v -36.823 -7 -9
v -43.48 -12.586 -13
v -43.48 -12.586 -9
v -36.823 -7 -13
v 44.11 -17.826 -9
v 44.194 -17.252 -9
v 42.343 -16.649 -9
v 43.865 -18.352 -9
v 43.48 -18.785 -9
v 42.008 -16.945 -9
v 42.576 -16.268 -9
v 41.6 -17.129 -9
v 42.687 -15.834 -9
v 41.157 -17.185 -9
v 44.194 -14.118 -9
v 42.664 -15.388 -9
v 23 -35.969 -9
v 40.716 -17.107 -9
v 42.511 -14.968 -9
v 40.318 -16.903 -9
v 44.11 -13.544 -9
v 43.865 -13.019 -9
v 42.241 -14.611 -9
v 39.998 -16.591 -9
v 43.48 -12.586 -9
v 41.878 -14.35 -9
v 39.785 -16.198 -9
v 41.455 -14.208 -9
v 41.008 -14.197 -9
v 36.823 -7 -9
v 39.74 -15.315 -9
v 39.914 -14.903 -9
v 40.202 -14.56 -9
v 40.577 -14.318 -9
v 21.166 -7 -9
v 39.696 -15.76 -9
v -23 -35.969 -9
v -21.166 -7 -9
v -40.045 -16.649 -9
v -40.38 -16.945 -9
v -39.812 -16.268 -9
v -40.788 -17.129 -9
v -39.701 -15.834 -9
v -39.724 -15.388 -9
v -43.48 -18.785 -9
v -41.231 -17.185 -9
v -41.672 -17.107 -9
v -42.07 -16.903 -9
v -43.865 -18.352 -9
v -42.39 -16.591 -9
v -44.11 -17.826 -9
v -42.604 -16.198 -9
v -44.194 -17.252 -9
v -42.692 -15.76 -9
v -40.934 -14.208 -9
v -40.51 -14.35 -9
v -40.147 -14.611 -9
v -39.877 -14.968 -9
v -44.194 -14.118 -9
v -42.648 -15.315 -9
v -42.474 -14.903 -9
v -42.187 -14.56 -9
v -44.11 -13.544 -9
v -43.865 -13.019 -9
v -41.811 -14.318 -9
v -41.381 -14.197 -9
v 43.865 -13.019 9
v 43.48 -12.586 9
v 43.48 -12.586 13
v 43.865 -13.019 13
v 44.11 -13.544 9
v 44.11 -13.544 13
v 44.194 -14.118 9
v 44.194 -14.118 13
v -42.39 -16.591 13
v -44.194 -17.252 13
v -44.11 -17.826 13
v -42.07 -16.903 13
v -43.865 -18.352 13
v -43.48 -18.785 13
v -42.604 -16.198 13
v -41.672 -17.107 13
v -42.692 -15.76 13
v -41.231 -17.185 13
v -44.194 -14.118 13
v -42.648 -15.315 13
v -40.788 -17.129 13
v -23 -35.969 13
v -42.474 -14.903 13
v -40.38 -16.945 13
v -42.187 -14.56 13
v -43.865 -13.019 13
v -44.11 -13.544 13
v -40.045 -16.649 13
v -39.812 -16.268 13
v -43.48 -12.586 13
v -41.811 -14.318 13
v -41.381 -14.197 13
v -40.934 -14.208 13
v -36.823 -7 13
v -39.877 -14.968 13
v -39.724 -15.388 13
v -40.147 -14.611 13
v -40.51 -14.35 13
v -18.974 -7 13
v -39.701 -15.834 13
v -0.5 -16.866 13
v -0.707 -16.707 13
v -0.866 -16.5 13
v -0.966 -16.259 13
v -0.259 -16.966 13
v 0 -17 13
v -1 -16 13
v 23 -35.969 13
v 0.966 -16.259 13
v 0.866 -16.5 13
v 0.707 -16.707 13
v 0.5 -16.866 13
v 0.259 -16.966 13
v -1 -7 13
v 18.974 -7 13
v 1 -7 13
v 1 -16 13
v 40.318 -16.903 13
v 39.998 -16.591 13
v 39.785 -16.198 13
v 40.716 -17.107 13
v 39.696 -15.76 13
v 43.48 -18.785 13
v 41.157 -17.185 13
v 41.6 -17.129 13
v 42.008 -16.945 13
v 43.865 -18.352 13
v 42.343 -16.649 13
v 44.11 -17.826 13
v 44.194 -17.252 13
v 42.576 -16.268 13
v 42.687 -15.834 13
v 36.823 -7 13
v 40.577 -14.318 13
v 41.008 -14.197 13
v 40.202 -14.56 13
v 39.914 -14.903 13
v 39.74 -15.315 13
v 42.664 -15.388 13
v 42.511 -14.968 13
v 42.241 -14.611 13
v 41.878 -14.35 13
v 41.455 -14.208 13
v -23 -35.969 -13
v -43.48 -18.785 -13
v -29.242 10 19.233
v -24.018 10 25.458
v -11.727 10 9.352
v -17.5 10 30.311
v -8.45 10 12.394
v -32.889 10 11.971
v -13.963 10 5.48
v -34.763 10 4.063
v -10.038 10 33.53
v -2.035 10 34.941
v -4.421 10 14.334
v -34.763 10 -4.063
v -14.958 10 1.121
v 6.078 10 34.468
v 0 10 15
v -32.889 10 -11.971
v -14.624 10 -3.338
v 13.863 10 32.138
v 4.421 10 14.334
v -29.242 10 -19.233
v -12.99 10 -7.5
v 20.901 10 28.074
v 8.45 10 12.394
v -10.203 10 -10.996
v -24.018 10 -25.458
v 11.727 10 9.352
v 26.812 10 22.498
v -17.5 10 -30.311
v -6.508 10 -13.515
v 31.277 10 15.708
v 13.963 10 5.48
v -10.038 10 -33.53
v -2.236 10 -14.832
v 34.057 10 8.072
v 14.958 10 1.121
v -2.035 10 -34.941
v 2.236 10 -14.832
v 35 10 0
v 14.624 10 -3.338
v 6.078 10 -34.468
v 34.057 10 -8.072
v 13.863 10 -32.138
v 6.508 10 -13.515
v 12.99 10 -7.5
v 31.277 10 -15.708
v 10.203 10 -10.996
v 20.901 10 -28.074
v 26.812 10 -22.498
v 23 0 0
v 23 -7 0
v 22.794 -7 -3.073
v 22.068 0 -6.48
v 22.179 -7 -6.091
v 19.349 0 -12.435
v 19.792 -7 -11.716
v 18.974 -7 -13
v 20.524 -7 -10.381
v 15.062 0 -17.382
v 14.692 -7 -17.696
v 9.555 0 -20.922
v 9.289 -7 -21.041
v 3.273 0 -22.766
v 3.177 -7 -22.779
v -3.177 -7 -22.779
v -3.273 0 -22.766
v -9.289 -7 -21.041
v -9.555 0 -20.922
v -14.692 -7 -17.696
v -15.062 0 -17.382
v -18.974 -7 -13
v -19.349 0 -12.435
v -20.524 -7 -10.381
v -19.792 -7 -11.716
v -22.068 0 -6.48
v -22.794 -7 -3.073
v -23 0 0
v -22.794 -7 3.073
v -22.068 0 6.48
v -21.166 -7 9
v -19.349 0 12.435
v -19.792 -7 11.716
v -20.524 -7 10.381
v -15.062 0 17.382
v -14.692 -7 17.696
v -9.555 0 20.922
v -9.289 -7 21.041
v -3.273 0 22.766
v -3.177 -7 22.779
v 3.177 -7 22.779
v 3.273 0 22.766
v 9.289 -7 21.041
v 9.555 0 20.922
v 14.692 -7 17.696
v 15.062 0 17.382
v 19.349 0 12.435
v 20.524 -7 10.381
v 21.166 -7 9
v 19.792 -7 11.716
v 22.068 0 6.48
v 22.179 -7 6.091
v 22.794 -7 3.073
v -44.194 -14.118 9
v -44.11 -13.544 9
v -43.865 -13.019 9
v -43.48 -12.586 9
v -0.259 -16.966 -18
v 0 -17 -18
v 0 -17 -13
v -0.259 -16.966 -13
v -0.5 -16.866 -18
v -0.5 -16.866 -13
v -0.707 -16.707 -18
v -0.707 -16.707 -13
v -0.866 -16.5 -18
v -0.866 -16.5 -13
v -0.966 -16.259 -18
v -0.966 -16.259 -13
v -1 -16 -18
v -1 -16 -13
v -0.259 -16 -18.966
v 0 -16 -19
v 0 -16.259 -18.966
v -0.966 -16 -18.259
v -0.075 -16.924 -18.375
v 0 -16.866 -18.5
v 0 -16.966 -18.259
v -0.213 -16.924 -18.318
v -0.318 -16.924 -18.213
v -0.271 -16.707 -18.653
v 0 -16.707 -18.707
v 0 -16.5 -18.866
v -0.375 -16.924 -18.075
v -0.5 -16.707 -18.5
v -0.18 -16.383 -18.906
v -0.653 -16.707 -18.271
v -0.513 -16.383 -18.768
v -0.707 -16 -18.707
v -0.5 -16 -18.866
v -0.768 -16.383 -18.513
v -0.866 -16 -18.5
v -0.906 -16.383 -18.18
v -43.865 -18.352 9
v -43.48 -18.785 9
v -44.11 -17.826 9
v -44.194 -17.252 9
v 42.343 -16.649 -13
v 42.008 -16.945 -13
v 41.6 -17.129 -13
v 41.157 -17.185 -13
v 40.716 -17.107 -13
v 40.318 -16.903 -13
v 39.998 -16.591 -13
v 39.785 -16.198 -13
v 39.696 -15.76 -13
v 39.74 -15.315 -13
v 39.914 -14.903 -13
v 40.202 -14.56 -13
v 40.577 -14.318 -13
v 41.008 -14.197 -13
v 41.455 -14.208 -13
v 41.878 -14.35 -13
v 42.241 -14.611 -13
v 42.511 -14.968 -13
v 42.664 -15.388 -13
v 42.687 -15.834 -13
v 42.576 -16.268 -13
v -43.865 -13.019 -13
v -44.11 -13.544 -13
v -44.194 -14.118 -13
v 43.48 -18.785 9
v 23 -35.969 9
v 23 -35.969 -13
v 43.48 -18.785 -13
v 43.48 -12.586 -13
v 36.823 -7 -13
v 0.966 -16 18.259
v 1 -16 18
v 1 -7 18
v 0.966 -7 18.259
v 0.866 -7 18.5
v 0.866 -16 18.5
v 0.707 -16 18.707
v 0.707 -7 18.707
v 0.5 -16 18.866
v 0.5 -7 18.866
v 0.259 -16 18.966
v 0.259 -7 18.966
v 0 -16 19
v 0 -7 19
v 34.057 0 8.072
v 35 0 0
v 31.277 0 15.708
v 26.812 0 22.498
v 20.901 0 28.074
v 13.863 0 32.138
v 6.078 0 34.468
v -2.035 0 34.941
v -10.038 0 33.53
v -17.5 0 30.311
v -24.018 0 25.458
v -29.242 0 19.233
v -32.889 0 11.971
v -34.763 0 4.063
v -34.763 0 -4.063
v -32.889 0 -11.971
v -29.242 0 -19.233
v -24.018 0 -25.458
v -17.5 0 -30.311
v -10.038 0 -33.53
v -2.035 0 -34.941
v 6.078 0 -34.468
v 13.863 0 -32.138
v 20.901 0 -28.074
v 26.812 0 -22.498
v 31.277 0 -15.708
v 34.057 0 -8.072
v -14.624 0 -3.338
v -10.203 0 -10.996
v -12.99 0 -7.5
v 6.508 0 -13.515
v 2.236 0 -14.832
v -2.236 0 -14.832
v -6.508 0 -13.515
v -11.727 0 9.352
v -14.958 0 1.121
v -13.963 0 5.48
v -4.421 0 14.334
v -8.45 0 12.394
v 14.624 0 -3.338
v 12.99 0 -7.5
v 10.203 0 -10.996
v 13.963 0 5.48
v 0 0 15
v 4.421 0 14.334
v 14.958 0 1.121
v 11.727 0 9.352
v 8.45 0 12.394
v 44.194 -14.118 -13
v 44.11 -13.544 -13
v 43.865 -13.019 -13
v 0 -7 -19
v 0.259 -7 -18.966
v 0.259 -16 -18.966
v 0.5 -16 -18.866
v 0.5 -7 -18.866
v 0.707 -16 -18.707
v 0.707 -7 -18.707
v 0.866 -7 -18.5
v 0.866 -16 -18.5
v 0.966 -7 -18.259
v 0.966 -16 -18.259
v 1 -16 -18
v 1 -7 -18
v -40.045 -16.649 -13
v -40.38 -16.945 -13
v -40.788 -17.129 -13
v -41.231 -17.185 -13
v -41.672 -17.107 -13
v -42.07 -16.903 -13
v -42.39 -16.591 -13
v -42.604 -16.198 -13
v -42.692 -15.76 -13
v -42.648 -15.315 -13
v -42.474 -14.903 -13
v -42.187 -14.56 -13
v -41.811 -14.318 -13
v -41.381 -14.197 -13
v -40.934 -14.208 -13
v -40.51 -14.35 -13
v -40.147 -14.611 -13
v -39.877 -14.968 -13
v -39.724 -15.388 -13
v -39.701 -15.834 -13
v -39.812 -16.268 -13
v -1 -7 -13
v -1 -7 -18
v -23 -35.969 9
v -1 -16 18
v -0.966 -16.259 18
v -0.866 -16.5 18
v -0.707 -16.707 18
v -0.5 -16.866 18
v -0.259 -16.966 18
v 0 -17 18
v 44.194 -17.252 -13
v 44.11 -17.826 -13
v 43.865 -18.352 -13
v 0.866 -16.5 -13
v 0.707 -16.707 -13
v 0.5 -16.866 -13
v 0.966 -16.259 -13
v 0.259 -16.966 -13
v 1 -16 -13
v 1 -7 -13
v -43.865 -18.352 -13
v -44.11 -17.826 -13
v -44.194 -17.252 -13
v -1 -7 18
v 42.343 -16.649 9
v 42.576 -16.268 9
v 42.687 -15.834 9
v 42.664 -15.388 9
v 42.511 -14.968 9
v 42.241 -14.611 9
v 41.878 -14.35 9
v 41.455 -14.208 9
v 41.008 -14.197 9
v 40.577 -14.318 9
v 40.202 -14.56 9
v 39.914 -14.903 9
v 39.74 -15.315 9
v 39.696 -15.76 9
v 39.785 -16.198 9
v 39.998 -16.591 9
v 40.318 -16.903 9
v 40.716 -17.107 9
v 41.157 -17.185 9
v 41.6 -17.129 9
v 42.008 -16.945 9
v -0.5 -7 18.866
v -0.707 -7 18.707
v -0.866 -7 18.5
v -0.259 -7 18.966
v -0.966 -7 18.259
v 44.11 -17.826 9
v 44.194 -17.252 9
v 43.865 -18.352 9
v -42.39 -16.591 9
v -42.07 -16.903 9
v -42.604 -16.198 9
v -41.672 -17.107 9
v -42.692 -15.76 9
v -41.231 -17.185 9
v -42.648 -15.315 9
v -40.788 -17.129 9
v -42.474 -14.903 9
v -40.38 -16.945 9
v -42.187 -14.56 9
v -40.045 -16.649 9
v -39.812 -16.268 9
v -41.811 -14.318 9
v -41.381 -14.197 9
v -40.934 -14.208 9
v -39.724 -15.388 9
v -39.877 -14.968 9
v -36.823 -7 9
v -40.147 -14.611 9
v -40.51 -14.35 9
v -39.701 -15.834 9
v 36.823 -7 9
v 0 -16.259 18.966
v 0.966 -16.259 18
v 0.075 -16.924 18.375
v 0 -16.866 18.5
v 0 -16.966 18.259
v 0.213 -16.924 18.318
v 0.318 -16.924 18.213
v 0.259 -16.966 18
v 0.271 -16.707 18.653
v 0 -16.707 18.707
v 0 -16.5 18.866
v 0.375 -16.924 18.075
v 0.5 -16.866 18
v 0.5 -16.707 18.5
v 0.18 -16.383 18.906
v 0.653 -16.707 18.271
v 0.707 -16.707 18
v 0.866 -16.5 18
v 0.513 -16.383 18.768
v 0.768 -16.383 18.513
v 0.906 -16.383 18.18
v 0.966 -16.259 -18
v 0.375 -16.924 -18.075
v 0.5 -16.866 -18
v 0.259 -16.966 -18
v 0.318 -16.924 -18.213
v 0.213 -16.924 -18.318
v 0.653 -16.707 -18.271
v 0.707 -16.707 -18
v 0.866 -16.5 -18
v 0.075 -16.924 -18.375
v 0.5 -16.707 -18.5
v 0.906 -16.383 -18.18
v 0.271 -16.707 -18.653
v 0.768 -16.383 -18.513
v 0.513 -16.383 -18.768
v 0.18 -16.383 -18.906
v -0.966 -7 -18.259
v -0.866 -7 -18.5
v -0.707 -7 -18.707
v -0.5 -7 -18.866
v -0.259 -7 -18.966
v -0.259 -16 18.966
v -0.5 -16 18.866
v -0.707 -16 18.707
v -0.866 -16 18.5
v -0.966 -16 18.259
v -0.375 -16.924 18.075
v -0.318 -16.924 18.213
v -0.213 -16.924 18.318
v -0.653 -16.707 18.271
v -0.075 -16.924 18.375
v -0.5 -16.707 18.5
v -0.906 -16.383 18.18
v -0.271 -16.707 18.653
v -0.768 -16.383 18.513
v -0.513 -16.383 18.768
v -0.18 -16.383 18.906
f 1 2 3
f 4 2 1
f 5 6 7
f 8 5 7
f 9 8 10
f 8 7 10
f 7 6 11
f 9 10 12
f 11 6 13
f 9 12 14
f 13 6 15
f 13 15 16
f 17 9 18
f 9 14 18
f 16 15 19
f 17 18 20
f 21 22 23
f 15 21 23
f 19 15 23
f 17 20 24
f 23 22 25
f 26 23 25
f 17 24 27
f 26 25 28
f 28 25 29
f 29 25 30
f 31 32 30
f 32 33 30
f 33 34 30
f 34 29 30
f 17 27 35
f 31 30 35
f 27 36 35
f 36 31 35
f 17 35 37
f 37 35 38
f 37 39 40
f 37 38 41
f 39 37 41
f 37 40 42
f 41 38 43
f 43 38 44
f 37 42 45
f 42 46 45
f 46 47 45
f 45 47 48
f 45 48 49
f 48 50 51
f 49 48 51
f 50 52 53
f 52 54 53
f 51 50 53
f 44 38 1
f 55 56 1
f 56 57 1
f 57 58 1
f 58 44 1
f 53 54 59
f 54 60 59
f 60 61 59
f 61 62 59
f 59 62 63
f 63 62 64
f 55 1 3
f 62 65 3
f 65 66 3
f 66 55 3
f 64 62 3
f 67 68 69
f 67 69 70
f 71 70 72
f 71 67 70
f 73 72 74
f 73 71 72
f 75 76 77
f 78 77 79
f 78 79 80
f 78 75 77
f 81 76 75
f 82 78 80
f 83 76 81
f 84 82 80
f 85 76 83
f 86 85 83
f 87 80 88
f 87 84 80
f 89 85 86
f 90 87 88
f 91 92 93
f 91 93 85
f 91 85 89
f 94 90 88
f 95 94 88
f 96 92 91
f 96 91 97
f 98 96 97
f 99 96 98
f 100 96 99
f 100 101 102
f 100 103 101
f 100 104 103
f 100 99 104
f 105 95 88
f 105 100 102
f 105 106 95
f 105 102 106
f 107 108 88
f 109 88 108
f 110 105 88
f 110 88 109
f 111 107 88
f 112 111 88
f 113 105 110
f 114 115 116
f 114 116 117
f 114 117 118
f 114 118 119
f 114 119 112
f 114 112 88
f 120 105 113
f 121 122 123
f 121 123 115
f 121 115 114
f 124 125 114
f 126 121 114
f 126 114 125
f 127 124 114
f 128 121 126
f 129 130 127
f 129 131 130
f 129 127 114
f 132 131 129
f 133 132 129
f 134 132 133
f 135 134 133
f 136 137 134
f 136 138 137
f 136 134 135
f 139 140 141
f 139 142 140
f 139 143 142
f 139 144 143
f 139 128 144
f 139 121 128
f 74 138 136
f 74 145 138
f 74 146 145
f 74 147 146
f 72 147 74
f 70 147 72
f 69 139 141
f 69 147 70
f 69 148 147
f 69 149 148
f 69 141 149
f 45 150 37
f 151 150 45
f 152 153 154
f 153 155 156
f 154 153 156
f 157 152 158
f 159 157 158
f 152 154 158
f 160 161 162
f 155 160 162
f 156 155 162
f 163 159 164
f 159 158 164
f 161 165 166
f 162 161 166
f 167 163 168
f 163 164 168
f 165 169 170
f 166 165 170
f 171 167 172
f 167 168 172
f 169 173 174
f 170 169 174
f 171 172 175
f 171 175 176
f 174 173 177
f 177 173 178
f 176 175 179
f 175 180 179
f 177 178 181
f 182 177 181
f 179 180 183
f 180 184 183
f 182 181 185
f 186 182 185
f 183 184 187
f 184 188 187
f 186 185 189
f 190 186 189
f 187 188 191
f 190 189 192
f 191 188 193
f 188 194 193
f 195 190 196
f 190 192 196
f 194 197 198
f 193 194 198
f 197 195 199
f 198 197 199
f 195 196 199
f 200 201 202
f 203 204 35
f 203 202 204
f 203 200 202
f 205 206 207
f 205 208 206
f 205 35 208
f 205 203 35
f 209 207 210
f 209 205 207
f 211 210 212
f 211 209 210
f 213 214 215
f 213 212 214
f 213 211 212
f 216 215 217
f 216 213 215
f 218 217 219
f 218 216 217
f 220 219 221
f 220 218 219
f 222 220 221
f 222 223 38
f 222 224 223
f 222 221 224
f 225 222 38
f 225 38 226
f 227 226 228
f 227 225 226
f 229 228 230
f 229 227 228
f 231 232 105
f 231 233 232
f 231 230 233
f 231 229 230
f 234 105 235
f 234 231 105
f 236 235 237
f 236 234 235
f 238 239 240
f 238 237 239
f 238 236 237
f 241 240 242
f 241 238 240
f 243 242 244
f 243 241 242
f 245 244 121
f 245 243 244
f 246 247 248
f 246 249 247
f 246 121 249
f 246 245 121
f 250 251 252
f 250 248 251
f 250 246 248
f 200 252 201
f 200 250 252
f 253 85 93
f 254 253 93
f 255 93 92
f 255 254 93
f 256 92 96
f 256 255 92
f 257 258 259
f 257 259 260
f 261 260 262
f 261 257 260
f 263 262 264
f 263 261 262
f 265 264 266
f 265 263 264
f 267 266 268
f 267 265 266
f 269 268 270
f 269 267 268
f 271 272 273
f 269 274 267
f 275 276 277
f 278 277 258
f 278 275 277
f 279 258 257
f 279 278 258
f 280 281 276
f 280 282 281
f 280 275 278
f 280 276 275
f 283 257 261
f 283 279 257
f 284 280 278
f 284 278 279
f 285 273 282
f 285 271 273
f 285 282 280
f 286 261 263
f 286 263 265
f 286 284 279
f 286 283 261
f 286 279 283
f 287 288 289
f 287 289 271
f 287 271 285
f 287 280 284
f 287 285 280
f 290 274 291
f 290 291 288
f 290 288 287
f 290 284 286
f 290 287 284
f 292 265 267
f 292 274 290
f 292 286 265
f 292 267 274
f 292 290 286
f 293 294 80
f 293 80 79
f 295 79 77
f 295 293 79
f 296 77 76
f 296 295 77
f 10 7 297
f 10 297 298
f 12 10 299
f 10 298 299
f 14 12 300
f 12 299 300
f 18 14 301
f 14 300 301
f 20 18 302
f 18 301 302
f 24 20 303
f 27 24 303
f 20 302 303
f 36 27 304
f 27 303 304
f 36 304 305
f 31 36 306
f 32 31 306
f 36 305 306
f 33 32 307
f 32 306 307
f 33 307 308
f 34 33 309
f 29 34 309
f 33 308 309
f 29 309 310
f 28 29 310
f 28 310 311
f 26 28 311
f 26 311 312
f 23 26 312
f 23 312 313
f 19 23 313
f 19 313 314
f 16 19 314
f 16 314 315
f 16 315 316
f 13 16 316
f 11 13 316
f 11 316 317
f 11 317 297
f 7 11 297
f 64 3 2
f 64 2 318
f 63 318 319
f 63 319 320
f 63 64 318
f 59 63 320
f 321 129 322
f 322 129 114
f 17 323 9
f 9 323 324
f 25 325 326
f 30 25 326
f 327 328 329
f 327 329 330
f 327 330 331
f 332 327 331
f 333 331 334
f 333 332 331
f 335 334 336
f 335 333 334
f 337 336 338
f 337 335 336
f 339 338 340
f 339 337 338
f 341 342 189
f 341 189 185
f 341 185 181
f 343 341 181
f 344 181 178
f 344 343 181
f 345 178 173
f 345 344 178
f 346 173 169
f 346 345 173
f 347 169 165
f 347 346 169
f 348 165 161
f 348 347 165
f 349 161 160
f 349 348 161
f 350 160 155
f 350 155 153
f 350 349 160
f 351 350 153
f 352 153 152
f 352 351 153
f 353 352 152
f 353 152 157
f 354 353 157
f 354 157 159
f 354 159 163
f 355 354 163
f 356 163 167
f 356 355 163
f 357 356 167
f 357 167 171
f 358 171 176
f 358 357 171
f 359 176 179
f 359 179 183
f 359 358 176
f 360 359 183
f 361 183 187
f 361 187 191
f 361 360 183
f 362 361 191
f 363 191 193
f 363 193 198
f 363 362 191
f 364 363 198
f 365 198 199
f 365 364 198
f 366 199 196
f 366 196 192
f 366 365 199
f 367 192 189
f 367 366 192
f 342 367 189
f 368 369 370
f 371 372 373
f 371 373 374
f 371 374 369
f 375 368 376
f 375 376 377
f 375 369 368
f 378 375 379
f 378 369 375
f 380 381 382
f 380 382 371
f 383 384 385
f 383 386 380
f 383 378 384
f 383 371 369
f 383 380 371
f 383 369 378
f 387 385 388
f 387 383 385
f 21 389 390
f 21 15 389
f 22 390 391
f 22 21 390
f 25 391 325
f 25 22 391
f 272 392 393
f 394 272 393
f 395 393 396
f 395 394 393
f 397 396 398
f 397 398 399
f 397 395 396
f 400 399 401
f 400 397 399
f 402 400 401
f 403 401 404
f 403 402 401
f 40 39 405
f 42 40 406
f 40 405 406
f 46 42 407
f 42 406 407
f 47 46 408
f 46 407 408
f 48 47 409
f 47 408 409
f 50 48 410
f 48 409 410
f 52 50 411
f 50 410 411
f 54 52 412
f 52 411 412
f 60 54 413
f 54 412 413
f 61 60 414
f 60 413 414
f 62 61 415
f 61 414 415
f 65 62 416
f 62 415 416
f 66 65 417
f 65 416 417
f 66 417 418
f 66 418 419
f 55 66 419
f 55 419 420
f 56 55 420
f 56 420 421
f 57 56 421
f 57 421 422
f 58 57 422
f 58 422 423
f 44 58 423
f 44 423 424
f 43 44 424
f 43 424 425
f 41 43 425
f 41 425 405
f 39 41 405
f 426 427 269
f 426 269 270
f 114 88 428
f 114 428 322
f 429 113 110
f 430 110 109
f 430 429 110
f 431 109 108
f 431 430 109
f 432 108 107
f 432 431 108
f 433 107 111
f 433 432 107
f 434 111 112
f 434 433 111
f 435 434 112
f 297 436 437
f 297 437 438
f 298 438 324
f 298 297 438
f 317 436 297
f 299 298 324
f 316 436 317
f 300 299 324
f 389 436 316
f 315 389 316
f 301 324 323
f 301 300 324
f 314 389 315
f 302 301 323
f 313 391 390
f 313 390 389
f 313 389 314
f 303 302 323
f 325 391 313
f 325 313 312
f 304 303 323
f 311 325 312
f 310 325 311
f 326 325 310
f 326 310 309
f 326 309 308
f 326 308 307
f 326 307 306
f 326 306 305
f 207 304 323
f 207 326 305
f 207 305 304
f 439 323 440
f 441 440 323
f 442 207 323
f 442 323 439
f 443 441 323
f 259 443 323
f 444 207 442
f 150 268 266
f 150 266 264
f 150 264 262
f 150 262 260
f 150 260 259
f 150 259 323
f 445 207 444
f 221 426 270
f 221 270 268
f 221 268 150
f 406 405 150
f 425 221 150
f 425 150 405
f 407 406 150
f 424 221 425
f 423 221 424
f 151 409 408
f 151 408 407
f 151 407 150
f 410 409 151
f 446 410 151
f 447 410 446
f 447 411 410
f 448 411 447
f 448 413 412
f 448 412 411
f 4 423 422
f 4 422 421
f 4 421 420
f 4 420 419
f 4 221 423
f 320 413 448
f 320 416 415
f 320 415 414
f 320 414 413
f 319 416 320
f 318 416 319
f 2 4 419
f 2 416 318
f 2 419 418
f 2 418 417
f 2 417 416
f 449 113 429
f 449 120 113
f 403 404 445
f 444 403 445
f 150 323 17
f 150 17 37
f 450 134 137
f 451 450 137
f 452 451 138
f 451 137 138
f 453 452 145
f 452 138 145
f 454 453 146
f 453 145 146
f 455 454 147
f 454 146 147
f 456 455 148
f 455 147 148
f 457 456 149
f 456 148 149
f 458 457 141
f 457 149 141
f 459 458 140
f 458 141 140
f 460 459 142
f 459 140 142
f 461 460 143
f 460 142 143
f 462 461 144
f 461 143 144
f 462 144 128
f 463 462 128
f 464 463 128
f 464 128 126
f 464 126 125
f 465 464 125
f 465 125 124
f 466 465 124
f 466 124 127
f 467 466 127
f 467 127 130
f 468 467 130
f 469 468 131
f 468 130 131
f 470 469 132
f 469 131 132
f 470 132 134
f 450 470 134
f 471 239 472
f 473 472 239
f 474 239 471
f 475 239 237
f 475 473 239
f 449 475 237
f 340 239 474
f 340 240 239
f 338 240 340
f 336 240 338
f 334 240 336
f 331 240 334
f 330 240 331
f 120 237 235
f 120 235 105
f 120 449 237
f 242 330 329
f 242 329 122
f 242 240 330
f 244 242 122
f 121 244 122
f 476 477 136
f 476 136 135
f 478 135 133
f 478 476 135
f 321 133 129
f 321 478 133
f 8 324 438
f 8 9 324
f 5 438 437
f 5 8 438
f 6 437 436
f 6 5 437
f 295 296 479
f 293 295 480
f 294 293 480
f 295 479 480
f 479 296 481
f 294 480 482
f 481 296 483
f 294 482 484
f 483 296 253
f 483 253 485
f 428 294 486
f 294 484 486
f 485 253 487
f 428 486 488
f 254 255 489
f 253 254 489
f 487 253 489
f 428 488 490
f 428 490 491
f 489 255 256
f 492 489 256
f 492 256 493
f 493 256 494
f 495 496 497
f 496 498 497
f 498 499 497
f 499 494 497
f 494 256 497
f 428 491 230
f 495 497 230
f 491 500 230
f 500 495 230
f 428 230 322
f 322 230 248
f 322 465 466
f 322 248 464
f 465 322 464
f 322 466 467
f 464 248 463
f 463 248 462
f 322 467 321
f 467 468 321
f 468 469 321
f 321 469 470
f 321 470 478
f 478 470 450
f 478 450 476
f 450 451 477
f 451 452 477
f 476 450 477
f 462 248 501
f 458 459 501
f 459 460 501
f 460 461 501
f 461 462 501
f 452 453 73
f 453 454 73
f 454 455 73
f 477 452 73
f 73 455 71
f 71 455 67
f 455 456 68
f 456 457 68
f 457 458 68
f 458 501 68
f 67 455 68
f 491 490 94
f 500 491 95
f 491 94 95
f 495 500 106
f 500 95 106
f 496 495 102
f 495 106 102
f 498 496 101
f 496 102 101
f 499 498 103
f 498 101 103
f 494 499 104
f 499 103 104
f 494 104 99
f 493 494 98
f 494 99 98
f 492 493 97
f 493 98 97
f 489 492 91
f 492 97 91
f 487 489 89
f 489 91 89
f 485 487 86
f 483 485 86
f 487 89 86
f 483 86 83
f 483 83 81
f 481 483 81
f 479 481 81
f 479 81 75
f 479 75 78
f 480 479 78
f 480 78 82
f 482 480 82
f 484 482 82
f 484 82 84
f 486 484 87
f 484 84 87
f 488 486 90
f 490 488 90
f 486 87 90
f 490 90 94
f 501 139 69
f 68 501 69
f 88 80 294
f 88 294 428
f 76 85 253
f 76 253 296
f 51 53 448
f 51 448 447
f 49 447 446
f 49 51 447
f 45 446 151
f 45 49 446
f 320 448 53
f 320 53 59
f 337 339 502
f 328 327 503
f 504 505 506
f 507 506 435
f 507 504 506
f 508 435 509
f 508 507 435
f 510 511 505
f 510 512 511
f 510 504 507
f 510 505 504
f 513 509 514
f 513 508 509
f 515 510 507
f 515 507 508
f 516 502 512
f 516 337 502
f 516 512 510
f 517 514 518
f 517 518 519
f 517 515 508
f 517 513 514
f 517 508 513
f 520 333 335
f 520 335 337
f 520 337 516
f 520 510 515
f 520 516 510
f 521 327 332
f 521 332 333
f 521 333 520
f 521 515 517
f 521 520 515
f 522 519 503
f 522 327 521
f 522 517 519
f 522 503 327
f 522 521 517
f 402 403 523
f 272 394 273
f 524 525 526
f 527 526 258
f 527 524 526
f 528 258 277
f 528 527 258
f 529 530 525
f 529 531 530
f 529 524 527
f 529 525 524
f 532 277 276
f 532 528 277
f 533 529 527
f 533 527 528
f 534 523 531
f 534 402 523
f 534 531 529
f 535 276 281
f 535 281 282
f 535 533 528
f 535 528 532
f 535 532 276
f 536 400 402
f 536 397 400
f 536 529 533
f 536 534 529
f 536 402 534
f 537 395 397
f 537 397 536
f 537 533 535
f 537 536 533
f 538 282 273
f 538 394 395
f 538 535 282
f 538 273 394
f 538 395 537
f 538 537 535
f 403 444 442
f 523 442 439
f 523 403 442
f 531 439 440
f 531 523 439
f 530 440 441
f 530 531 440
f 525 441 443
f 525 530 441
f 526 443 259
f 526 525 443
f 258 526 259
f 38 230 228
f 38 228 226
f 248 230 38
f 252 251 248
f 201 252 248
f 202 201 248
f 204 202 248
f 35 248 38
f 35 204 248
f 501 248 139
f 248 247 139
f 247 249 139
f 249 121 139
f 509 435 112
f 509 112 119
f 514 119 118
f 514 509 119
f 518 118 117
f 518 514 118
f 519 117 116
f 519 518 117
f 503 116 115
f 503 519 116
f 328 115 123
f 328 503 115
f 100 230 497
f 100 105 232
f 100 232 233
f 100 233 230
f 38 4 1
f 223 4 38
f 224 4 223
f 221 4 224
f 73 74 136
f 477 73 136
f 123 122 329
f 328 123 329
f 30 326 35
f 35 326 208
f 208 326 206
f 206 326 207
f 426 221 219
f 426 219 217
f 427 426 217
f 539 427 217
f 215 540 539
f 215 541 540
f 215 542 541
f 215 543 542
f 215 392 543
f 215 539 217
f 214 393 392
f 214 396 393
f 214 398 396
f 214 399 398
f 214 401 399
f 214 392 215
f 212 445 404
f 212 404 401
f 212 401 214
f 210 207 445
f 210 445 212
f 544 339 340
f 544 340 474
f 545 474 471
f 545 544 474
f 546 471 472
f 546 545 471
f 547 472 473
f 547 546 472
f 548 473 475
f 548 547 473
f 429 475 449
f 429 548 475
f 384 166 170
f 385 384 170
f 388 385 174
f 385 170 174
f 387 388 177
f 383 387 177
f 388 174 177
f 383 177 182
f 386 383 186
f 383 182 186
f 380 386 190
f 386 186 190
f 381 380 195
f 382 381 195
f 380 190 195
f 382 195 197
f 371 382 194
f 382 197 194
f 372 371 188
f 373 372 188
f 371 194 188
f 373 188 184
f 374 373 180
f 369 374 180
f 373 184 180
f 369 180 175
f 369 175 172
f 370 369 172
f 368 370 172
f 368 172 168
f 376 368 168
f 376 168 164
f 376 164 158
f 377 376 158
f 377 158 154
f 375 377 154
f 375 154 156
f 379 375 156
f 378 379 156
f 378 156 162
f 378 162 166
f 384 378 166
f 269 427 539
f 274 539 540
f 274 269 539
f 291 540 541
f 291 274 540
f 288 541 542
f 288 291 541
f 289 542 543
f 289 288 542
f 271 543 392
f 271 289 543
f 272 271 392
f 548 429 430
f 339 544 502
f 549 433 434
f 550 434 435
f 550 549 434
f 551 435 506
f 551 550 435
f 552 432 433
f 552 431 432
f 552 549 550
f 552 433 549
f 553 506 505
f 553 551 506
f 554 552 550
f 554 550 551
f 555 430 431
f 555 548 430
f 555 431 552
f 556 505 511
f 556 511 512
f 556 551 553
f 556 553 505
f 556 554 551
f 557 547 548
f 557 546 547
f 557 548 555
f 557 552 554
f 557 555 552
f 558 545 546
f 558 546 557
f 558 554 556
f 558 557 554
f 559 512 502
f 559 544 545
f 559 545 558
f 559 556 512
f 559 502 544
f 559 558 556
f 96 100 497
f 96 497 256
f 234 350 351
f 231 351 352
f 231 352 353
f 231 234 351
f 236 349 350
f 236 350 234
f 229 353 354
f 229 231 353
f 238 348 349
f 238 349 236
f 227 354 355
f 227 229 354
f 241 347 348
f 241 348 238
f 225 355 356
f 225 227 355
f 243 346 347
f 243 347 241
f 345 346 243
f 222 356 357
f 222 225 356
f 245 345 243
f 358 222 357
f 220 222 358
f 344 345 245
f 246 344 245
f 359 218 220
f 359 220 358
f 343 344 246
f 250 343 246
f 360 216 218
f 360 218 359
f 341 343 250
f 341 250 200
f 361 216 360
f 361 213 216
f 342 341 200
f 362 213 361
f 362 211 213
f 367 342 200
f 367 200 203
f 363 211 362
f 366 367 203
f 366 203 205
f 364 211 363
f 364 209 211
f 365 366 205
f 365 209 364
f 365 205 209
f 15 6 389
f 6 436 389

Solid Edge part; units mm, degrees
sketch "Sketch1" plane through (0, 0, 0) normal (0, -1, 0) x (1, 0, 0)
  circle A0 centre (0, 0) radius 35
  dimension "D1" = 70
extrude "Protrusion1" add sketch "Sketch1" against normal blind 10
sketch "Sketch2" plane through (0, 0, 0) normal (0, -1, 0) x (1, 0, 0)
  circle A0 centre (0, 0) radius 23
extrude "ExtrudedProtrusion_2" add sketch "Sketch2" along normal blind 7
sketch "Sketch3" plane through (0, 0, 13) normal (0, 0, 1) x (1, 0, 0)
  line L0 (0, -7) -> (-36.8229, -7)
  line L1 (-36.8229, -7) -> (-44.194, -13.1851)
  line L2 (-44.194, -13.1851) -> (-44.194, -18.1851)
  line L3 (-44.194, -18.1851) -> (-23, -35.969)
  line L4 (-23, -35.969) -> (0, -35.969)
  line L5 (23, -35.969) -> (0, -35.969)
  line L6 (44.194, -18.1851) -> (23, -35.969)
  line L7 (44.194, -13.1851) -> (44.194, -18.1851)
  line L8 (36.8229, -7) -> (44.194, -13.1851)
  line L9 (0, -7) -> (36.8229, -7)
  dimension "D1" = 5
  dimension "D2" = 44.194
extrude "ExtrudedProtrusion_3" add sketch "Sketch3" against normal blind 4
sketch "Sketch4" plane through (0, -21.4845, 13) normal (0, 0, 1) x (0.766, -0.6428, 0)
  circle A0 centre (-35.2842, -22.0364) radius 1.5
  circle A1 centre (27.8287, 30.9216) radius 1.5
extrude "ExtrudedCutout_1" cut sketch "Sketch4" against normal blind 33.266
fillet "Round_1" radius 2 4 edges at (-44.194, -13.1851, 11) (-44.194, -18.1851, 11) (44.194, -18.1851, 11) (44.194, -13.1851, 11)
mirror "Mirror1" about plane through (0, 0, 0) normal (0, 0, 1) of "ExtrudedProtrusion_3", "ExtrudedCutout_1"
fillet "Round1" radius 2 4 edges at (-44.194, -13.1851, -11) (-44.194, -18.1851, -11) (44.194, -18.1851, -11) (44.194, -13.1851, -11)
sketch "Sketch5" plane through (0, -7, 18) normal (0, -1, 0) x (1, 0, 0)
  line L0 (0, -5) -> (-1, -5)
  line L1 (-1, -5) -> (-1, 1)
  line L2 (-1, 1) -> (0, 1)
  line L3 (1, 1) -> (0, 1)
  line L4 (1, -5) -> (1, 1)
  line L5 (0, -5) -> (1, -5)
extrude "ExtrudedProtrusion_5" add sketch "Sketch5" along normal blind 10
fillet "Round_3" radius 1 5 edges at (-1, -12, 19) (1, -12, 19) (1, -17, 16) (-1, -17, 16) (0, -17, 19)
mirror "Mirror2" about plane through (0, 0, 0) normal (0, 0, 1) of "ExtrudedProtrusion_5"
fillet "Round2" radius 1 5 edges at (-1, -12, -19) (1, -12, -19) (1, -17, -16) (-1, -17, -16) (0, -17, -19)
sketch "Sketch6" plane through (0, 10, 0) normal (0, 1, 0) x (0, 0, 1)
  circle A0 centre (0, 0) radius 15
extrude "ExtrudedCutout_3" cut sketch "Sketch6" against normal blind 10
